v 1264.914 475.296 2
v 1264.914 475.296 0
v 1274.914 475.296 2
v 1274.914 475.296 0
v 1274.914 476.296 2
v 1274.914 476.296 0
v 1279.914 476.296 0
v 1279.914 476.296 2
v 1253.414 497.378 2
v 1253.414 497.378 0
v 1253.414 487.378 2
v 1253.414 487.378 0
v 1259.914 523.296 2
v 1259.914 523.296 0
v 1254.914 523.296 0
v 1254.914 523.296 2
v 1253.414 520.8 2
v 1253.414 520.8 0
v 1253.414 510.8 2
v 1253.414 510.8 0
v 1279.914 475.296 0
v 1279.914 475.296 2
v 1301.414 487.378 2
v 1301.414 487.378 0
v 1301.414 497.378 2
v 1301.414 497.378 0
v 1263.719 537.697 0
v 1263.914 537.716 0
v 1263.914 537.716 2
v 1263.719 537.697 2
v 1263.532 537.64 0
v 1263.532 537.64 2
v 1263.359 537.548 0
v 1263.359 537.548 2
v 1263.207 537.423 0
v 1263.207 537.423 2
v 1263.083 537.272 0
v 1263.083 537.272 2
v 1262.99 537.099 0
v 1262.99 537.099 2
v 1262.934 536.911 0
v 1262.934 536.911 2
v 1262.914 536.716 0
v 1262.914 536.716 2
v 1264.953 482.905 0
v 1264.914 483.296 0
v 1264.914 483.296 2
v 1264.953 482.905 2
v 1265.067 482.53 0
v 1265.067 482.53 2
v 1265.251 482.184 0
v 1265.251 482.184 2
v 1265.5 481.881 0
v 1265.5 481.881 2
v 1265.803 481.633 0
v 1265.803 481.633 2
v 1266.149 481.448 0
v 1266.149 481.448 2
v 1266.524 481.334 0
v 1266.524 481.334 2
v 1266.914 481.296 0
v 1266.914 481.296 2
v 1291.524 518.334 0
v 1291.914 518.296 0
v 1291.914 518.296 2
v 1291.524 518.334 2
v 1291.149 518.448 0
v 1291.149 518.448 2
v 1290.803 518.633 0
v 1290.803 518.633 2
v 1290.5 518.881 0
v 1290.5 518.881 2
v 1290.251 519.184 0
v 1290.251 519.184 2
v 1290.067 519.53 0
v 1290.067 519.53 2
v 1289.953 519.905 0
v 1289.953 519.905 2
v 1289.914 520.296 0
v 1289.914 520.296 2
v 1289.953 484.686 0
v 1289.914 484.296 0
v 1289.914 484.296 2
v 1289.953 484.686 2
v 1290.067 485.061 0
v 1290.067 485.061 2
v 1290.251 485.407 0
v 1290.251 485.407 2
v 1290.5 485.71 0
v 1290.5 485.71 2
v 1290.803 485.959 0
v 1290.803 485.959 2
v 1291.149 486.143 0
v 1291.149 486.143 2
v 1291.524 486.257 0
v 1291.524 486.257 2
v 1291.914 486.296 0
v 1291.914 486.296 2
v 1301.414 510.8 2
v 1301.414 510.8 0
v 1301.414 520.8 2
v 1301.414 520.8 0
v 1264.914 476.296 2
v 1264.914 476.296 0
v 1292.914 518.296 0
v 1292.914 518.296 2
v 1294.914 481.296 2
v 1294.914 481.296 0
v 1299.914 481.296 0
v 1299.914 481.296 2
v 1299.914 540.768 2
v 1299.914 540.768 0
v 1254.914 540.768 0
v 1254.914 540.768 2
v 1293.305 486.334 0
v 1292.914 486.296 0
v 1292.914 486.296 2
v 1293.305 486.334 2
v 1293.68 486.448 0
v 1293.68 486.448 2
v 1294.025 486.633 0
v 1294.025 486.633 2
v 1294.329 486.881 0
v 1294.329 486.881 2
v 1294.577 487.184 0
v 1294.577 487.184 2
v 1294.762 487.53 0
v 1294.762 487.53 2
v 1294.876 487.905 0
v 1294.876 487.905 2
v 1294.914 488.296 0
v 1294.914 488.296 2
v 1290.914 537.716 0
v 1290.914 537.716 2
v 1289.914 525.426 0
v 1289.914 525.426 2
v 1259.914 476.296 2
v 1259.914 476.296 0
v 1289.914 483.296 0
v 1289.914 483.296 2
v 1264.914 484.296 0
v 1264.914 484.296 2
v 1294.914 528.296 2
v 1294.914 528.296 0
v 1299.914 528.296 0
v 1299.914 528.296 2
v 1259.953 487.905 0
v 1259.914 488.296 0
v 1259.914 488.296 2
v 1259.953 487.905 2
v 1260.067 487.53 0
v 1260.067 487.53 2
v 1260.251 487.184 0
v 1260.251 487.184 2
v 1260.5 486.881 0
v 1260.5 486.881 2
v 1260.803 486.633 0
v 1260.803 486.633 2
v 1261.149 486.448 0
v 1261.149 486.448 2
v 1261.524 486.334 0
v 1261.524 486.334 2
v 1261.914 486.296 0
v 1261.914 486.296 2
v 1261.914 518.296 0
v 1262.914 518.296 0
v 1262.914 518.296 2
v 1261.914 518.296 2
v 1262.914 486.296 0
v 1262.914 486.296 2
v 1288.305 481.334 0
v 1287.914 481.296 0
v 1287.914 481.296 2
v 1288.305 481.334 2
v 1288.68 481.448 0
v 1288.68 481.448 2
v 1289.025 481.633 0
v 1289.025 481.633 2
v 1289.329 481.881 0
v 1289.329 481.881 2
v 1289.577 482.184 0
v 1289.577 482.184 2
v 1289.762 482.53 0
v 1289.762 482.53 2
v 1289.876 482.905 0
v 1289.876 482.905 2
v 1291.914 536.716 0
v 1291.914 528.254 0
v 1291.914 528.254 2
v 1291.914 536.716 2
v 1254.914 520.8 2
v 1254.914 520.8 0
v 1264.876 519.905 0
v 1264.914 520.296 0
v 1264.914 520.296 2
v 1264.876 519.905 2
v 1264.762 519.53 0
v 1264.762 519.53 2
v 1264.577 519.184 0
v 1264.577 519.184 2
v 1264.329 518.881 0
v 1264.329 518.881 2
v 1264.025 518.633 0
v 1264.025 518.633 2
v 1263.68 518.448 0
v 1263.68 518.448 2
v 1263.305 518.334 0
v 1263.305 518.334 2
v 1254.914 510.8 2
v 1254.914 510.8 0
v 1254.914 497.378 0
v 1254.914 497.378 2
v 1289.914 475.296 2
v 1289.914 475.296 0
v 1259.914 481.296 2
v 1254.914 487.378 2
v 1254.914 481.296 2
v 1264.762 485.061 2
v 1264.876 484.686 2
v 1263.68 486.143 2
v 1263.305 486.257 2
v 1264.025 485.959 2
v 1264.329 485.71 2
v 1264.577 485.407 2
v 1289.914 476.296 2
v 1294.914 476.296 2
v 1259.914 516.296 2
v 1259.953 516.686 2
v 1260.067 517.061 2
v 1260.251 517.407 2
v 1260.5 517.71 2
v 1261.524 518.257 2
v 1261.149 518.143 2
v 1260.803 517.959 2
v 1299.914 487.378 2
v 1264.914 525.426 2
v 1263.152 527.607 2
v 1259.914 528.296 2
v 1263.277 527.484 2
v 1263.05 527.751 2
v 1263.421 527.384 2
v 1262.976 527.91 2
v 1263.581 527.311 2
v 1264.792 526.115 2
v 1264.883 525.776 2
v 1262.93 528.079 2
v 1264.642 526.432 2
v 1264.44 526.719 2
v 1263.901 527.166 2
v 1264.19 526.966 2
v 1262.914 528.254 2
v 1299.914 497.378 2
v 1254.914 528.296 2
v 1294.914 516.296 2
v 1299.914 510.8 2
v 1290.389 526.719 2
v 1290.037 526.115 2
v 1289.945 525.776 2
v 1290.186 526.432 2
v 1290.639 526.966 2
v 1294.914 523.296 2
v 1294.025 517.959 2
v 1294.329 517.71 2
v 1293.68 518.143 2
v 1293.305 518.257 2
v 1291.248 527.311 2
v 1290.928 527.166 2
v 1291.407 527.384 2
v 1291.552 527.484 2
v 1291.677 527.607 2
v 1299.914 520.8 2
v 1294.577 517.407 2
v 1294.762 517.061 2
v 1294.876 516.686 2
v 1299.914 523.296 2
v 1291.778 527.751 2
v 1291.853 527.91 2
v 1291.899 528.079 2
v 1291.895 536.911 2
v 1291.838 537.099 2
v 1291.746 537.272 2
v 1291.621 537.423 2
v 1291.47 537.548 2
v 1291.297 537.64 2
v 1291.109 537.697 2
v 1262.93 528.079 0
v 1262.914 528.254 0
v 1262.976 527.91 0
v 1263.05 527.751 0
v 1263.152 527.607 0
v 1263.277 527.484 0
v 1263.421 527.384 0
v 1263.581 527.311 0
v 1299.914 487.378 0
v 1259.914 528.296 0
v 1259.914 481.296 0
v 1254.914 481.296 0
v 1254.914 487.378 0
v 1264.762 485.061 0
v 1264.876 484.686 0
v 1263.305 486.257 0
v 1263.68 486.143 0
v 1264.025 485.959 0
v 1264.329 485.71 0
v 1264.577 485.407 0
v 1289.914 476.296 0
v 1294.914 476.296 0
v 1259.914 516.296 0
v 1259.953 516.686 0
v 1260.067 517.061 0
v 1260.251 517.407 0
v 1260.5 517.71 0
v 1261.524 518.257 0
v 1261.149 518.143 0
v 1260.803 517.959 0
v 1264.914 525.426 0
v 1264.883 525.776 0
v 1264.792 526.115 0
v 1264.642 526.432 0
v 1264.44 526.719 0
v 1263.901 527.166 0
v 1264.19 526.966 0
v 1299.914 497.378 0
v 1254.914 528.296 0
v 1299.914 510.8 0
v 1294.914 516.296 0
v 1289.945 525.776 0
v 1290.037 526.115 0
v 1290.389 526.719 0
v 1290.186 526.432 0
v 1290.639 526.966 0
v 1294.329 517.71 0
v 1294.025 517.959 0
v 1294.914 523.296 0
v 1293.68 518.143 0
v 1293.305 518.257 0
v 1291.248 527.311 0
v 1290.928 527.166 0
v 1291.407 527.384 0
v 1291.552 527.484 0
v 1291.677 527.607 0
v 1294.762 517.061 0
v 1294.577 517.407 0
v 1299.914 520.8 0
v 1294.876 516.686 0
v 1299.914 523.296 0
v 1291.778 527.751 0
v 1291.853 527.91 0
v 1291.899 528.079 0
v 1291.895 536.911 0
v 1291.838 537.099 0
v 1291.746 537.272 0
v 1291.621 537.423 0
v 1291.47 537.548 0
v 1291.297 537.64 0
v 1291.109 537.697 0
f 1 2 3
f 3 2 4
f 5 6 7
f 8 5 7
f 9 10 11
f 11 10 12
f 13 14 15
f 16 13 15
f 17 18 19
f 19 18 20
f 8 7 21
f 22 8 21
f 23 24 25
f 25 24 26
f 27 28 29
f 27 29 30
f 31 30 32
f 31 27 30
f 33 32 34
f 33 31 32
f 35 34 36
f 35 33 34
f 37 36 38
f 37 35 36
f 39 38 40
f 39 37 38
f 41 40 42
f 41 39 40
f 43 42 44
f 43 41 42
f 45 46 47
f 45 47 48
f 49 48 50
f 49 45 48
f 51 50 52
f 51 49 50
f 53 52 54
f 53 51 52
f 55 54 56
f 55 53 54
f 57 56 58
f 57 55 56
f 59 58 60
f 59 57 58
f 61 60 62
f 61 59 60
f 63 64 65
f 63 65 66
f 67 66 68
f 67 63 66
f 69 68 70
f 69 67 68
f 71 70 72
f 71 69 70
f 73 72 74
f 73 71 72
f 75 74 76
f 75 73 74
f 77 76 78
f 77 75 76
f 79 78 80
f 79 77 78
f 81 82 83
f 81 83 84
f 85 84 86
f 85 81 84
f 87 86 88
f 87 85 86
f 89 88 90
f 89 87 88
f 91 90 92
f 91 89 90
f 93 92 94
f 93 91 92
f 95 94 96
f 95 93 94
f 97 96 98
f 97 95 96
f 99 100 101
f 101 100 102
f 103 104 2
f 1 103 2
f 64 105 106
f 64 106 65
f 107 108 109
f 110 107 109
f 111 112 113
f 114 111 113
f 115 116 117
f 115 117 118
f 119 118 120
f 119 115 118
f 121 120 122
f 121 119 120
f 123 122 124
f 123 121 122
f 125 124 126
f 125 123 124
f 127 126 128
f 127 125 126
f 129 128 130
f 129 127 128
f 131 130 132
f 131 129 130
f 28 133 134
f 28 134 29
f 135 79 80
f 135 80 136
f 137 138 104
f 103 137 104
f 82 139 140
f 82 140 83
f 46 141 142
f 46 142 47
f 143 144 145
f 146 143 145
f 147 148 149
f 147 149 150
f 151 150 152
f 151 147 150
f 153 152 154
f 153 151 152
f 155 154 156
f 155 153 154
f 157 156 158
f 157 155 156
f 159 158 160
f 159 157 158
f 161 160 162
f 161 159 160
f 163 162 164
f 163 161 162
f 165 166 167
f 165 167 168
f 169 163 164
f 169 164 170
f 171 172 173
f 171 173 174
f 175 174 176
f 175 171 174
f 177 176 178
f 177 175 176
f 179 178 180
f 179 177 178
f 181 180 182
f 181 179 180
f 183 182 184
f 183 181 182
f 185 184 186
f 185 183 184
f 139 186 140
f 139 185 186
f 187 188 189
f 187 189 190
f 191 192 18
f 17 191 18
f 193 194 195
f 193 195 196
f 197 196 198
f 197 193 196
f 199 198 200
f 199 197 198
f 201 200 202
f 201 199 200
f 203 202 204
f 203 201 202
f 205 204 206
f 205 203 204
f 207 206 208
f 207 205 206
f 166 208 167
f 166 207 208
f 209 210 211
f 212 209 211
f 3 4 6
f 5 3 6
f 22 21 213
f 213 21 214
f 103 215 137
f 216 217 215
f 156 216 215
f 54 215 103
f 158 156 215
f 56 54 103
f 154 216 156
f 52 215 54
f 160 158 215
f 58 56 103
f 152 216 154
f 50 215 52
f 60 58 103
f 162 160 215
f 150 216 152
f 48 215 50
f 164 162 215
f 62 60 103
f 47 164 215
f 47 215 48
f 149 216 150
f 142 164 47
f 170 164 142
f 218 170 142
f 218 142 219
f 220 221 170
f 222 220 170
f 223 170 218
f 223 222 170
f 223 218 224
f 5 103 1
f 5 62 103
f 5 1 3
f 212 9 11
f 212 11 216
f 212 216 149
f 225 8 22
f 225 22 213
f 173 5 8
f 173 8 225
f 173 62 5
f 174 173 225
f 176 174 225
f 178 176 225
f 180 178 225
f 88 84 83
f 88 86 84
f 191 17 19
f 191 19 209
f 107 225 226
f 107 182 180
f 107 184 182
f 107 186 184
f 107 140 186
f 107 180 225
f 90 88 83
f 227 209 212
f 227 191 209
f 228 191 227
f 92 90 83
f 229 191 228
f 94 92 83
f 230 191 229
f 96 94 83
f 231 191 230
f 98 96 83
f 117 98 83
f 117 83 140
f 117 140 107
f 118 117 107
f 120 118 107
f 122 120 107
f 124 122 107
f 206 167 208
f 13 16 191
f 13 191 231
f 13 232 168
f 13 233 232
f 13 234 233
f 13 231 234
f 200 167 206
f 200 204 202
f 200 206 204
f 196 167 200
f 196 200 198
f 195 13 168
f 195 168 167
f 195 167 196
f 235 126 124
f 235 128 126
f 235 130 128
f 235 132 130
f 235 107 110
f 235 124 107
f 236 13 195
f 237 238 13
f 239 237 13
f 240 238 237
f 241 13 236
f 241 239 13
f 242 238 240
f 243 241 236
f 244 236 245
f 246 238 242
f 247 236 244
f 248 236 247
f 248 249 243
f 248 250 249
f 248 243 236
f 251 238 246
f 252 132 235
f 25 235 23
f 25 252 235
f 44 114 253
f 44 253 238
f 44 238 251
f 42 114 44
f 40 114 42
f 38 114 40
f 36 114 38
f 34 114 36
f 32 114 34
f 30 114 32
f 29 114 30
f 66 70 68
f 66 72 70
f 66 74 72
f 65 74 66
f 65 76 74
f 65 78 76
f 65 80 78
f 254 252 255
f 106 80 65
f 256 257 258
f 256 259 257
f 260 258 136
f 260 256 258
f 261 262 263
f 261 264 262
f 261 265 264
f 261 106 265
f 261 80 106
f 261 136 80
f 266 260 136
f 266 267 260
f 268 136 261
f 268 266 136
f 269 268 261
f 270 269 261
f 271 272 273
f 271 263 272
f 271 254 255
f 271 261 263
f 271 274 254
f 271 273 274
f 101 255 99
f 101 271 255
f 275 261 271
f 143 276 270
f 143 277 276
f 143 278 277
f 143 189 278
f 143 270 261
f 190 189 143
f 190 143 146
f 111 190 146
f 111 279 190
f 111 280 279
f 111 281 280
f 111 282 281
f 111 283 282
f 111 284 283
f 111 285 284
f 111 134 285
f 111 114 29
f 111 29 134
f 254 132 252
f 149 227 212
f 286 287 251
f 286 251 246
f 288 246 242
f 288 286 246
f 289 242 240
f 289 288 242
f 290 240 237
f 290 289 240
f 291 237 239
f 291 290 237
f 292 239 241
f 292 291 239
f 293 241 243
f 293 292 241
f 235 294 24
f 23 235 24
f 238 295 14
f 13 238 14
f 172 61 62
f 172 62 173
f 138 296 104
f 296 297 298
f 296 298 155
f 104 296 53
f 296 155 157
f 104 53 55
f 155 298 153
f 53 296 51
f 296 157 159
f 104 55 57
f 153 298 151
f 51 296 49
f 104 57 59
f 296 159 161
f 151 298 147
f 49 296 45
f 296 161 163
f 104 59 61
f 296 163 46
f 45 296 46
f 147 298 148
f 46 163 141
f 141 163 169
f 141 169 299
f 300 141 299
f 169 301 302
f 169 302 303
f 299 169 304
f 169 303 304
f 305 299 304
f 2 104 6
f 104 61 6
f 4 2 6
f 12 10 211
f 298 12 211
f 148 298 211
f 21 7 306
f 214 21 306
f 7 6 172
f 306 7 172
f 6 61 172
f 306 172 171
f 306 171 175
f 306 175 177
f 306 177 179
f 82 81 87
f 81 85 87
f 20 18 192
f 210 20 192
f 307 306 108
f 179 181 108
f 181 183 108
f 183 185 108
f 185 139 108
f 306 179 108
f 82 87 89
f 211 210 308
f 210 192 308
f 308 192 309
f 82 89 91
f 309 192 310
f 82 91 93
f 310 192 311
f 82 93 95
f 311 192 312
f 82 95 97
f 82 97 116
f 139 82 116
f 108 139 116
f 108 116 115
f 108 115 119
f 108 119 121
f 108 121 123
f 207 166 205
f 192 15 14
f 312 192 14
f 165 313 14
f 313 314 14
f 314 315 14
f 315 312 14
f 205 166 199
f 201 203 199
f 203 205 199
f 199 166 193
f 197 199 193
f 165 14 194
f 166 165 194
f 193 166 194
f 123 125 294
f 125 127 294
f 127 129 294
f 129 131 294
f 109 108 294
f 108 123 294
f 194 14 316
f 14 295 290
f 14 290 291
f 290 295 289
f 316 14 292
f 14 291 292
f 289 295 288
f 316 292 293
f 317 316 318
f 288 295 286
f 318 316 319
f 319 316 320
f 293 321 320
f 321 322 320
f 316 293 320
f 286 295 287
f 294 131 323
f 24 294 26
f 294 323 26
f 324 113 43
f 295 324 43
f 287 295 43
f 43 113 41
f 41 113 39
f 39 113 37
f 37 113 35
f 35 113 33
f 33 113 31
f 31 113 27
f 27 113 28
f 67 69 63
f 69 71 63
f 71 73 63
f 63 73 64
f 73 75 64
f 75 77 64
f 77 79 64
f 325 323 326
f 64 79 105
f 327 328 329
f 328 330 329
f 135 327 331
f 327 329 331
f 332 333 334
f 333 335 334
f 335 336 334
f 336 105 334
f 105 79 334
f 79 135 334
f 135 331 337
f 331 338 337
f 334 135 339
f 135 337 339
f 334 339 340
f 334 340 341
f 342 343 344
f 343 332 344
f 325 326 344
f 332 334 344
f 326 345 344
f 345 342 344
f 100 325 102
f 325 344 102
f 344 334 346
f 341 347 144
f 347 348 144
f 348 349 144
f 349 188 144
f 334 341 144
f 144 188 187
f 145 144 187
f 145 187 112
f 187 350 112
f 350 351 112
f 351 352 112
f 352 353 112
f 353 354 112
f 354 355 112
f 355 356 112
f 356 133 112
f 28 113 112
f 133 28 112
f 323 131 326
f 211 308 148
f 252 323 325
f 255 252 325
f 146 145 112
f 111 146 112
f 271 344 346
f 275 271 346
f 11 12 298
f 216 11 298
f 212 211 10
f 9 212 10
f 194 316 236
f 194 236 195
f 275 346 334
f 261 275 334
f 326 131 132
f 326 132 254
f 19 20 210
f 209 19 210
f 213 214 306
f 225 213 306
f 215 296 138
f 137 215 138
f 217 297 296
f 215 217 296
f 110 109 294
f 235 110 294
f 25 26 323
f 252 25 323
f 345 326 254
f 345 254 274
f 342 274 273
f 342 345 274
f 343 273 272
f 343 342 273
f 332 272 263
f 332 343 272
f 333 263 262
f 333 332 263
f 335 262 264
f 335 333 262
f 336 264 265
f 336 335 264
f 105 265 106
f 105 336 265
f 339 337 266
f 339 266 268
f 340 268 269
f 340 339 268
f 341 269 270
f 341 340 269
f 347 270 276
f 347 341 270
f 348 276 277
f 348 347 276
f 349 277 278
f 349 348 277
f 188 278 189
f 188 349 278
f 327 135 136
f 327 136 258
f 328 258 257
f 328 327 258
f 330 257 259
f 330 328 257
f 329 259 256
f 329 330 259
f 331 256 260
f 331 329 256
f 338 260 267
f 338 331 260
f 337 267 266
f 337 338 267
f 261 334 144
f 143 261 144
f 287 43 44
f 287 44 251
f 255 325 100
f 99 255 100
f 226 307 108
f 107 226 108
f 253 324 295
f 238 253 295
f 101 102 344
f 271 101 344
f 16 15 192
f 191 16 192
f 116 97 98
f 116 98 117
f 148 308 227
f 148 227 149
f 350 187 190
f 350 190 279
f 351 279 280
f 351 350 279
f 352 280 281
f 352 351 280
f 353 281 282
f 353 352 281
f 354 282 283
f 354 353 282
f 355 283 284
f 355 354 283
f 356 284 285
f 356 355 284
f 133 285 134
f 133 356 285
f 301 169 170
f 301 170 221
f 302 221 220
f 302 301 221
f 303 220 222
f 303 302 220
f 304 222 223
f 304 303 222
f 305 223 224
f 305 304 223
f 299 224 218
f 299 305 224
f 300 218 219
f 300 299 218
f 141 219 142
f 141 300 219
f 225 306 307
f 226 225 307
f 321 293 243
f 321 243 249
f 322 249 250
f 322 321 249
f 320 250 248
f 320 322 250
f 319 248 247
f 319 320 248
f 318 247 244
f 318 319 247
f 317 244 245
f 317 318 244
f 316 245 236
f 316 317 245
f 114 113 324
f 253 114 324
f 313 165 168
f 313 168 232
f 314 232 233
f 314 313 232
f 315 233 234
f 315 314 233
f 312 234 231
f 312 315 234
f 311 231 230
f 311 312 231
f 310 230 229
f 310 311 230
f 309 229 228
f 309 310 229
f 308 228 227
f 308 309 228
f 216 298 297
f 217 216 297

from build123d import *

# Parameters (mm, degrees)
EXTRUDE_1_DEPTH = 2


with BuildPart() as part:
    # Model → 凸台-拉伸1 (new body)
    with BuildSketch(Plane.XY):
        Polygon((1254.914320118, 540.768046392), (1254.914320118, 528.295619897), (1259.914320118, 528.295619897), (1259.914320118, 523.295619897), (1254.914320118, 523.295619897), (1254.914320118, 520.800244347), (1253.414320118, 520.800244347), (1253.414320118, 510.800244347), (1254.914320118, 510.800244347), (1254.914320118, 497.378469897), (1253.414320118, 497.378469897), (1253.414320118, 487.378469897), (1254.914320118, 487.378469897), (1254.914320118, 481.295619897), (1259.914320118, 481.295619897), (1259.914320118, 476.295619897), (1264.914320118, 476.295619897), (1264.914320118, 475.295619897), (1274.914320118, 475.295619897), (1274.914320118, 476.295619897), (1279.914320118, 476.295619897), (1279.914320118, 475.295619897), (1289.914320118, 475.295619897), (1289.914320118, 476.295619897), (1294.914320118, 476.295619897), (1294.914320118, 481.295619897), (1299.914320118, 481.295619897), (1299.914320118, 487.378469897), (1301.414320118, 487.378469897), (1301.414320118, 497.378469897), (1299.914320118, 497.378469897), (1299.914320118, 510.800244347), (1301.414320118, 510.800244347), (1301.414320118, 520.800244347), (1299.914320118, 520.800244347), (1299.914320118, 523.295619897), (1294.914320118, 523.295619897), (1294.914320118, 528.295619897), (1299.914320118, 528.295619897), (1299.914320118, 540.768046392), align=None)
        with BuildLine():
            Line((1264.914320118, 525.425619897), (1264.914320118, 520.295619897))
            ThreePointArc((1264.914320118, 520.295619897), (1264.32853368, 518.881406334), (1262.914320118, 518.295619897))
            Line((1262.914320118, 518.295619897), (1261.914320118, 518.295619897))
            ThreePointArc((1261.914320118, 518.295619897), (1260.500106556, 517.709833459), (1259.914320118, 516.295619897))
            Line((1259.914320118, 516.295619897), (1259.914320118, 488.295619897))
            ThreePointArc((1259.914320118, 488.295619897), (1260.500106556, 486.881406334), (1261.914320118, 486.295619897))
            Line((1261.914320118, 486.295619897), (1262.914320118, 486.295619897))
            ThreePointArc((1262.914320118, 486.295619897), (1264.32853368, 485.709833459), (1264.914320118, 484.295619897))
            Line((1264.914320118, 484.295619897), (1264.914320118, 483.295619897))
            ThreePointArc((1264.914320118, 483.295619897), (1265.500106556, 481.881406334), (1266.914320118, 481.295619897))
            Line((1266.914320118, 481.295619897), (1287.914320118, 481.295619897))
            ThreePointArc((1287.914320118, 481.295619897), (1289.32853368, 481.881406334), (1289.914320118, 483.295619897))
            Line((1289.914320118, 483.295619897), (1289.914320118, 484.295619897))
            ThreePointArc((1289.914320118, 484.295619897), (1290.500106556, 485.709833459), (1291.914320118, 486.295619897))
            Line((1291.914320118, 486.295619897), (1292.914320118, 486.295619897))
            ThreePointArc((1292.914320118, 486.295619897), (1294.32853368, 486.881406334), (1294.914320118, 488.295619897))
            Line((1294.914320118, 488.295619897), (1294.914320118, 516.295619897))
            ThreePointArc((1294.914320118, 516.295619897), (1294.32853368, 517.709833459), (1292.914320118, 518.295619897))
            Line((1292.914320118, 518.295619897), (1291.914320118, 518.295619897))
            ThreePointArc((1291.914320118, 518.295619897), (1290.500106556, 518.881406334), (1289.914320118, 520.295619897))
            Line((1289.914320118, 520.295619897), (1289.914320118, 525.425619897))
            ThreePointArc((1289.914320118, 525.425619897), (1290.281326956, 526.580320435), (1291.247653451, 527.31123798))
            ThreePointArc((1291.247653451, 527.31123798), (1291.730816699, 527.676696752), (1291.914320118, 528.254047021))
            Line((1291.914320118, 528.254047021), (1291.914320118, 536.716299759))
            ThreePointArc((1291.914320118, 536.716299759), (1291.621426899, 537.42340654), (1290.914320118, 537.716299759))
            Line((1290.914320118, 537.716299759), (1263.914320118, 537.716299759))
            ThreePointArc((1263.914320118, 537.716299759), (1263.207213337, 537.42340654), (1262.914320118, 536.716299759))
            Line((1262.914320118, 536.716299759), (1262.914320118, 528.254047021))
            ThreePointArc((1262.914320118, 528.254047021), (1263.097823537, 527.676696752), (1263.580986785, 527.31123798))
            ThreePointArc((1263.580986785, 527.31123798), (1264.54731328, 526.580320435), (1264.914320118, 525.425619897))
        make_face(mode=Mode.SUBTRACT)
    extrude(amount=EXTRUDE_1_DEPTH)


solid = part.part
